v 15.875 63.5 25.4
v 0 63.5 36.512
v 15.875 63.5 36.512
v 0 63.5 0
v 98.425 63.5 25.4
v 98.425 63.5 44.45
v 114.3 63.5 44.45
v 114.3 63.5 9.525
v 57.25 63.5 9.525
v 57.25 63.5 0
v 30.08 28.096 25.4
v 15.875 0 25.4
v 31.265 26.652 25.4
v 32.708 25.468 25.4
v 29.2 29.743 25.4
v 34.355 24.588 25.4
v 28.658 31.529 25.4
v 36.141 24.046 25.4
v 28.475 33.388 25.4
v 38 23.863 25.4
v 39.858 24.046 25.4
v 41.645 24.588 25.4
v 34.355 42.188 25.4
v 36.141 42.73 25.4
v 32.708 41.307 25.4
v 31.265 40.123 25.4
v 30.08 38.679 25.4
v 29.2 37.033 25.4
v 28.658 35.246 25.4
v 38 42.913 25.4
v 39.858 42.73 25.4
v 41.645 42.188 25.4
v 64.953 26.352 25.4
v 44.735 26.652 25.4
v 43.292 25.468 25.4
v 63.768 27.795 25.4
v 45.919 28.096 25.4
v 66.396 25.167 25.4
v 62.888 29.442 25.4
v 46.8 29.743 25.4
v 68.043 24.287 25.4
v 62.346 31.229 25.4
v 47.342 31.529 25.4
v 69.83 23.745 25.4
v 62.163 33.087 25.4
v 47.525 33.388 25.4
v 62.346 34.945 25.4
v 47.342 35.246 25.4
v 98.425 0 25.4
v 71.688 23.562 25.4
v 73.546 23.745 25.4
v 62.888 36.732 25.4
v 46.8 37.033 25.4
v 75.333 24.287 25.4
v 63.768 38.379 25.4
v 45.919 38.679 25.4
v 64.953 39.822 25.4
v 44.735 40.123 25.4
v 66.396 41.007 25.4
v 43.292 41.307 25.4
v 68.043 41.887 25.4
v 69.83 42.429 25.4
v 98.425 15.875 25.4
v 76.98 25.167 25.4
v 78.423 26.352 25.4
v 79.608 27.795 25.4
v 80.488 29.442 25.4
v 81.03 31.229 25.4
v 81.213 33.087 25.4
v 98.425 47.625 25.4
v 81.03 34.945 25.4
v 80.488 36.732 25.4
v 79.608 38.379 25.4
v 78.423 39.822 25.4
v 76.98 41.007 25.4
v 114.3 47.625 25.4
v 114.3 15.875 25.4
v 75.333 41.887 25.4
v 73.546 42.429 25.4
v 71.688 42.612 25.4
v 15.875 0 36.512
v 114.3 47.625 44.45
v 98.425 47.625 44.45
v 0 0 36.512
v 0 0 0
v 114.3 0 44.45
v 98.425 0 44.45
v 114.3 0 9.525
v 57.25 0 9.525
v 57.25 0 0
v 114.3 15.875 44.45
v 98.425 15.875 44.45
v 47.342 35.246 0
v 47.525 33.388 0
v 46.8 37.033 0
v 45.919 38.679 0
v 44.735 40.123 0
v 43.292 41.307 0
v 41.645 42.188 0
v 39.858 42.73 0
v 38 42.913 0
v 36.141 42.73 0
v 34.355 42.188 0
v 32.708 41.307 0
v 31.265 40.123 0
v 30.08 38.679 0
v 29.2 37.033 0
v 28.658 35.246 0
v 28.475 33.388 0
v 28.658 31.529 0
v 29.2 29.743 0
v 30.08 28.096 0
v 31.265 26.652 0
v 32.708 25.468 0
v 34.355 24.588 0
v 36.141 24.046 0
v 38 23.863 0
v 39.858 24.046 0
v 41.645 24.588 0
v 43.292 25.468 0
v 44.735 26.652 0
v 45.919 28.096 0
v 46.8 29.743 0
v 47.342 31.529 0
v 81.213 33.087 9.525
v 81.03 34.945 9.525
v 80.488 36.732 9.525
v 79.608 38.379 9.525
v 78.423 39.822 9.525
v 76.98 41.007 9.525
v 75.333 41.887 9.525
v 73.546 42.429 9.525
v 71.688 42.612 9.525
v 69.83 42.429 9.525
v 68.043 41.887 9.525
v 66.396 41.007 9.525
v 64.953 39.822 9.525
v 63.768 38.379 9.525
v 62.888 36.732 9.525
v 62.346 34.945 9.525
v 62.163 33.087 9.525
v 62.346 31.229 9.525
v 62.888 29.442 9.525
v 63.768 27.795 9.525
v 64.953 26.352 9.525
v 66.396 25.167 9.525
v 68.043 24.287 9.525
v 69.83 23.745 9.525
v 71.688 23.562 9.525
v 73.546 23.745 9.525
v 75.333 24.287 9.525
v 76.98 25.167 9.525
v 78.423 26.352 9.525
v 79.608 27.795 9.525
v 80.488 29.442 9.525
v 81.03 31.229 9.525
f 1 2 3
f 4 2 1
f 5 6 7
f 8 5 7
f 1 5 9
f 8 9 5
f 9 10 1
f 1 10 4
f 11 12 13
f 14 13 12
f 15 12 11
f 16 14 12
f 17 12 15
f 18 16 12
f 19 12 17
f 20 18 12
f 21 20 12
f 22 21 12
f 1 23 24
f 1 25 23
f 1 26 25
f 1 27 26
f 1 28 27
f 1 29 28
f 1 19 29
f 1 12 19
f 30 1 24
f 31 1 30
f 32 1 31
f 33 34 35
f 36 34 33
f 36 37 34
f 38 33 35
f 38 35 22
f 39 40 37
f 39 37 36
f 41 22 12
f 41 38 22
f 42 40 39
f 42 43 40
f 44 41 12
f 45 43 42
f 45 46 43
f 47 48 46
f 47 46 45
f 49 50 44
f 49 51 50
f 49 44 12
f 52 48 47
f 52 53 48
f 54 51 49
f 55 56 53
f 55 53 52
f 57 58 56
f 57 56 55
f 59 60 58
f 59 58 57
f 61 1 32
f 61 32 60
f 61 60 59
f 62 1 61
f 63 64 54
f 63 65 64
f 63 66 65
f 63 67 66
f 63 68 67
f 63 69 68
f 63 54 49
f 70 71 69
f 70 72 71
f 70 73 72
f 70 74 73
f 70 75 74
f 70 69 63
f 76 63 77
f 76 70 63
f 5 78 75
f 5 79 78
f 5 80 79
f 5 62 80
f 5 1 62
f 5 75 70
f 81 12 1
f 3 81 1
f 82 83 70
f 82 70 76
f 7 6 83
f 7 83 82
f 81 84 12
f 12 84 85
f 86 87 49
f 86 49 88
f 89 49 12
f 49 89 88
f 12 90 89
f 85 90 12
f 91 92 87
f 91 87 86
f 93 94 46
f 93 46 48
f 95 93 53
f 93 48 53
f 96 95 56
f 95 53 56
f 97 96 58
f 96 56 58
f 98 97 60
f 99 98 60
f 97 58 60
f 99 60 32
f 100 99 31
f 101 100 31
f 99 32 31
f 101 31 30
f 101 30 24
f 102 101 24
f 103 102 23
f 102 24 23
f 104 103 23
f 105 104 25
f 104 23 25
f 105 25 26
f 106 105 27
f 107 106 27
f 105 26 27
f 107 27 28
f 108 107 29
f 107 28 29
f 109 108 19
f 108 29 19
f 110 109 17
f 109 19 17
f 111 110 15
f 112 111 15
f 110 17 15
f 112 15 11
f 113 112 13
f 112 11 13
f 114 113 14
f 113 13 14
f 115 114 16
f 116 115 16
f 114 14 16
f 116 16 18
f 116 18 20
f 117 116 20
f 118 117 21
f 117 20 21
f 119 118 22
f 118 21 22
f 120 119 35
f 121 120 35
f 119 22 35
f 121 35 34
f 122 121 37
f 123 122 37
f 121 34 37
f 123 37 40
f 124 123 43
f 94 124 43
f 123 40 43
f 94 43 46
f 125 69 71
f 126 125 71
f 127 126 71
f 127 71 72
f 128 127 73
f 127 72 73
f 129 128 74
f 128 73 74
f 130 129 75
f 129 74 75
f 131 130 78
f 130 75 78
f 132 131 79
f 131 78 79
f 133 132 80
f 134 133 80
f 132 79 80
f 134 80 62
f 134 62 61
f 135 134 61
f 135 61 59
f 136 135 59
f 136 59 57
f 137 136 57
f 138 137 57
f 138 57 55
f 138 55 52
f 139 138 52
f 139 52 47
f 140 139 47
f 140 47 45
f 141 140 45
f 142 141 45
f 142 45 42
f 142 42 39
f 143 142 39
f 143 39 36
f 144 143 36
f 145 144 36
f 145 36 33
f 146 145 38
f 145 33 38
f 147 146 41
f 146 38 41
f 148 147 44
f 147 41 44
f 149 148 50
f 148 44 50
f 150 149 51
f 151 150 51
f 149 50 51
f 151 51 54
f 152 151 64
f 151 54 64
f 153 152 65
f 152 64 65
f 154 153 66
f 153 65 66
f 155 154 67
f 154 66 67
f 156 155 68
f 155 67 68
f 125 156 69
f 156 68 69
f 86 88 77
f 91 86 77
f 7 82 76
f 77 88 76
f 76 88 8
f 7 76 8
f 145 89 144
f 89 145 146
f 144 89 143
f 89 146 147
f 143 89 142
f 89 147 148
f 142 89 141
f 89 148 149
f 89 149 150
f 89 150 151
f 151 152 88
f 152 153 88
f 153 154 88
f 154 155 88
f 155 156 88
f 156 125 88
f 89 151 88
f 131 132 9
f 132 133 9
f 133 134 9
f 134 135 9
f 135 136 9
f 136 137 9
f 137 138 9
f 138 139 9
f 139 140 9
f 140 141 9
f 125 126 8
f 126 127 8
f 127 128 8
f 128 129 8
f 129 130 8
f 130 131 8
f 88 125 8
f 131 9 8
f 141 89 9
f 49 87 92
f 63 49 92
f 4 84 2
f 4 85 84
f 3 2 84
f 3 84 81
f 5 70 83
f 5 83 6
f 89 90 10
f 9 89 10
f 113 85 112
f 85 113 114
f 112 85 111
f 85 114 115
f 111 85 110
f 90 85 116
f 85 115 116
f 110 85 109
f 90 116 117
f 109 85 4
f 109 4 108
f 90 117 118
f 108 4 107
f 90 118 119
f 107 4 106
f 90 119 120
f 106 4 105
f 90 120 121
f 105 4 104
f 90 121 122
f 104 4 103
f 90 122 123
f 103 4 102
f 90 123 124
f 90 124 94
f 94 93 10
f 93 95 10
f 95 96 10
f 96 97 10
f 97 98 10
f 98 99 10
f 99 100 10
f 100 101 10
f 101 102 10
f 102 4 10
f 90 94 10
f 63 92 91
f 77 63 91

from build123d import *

# Parameters (mm, degrees)
F0_W      = 114.3
F0_H      = 63.5
F1_DEPTH  = 36.5125
F2_W      = 114.3
F2_H      = 63.5
F3_DEPTH  = 11.1125
F4_W      = 57.1499951184
F4_H      = 64.068160916
F5_DEPTH  = 9.525
F6_W      = 15.875
F6_H      = 15.875
F7_DEPTH  = 19.05
F8_W      = 15.875
F8_H      = 15.875
F9_DEPTH  = 19.05
F10_W     = 15.875
F10_H     = 63.5
F11_DEPTH = 11.1125
F12_R     = 9.525
F13_DEPTH = 25.4
F14_R     = 9.525
F15_DEPTH = 25.4


with BuildPart() as f1:
    # F0 (on Top) → F1 (new body)
    with BuildSketch(Plane.XY):
        with Locations((57.15, 31.75)):
            Rectangle(F0_W, F0_H)
    extrude(amount=F1_DEPTH)

    # F2 (on face) → F3 (cut)
    with BuildSketch(Plane.XY.offset(36.5125)):
        with Locations((57.15, 31.75)):
            Rectangle(F2_W, F2_H)
    extrude(amount=-F3_DEPTH, mode=Mode.SUBTRACT)

    # F4 (on Top) → F5 (cut)
    with BuildSketch(Plane.XY):
        with Locations((85.8252625912, 32.034080458)):
            Rectangle(F4_W, F4_H)
    extrude(amount=F5_DEPTH, mode=Mode.SUBTRACT)

    # F6 (on face) → F7 (join)
    with BuildSketch(Plane.XY.offset(25.4)):
        with Locations((106.3625, 7.9375)):
            Rectangle(F6_W, F6_H)
    extrude(amount=F7_DEPTH)

    # F8 (on face) → F9 (join)
    with BuildSketch(Plane.XY.offset(25.4)):
        with Locations((106.3625, 55.5625)):
            Rectangle(F8_W, F8_H)
    extrude(amount=F9_DEPTH)

    # F10 (on face) → F11 (join)
    with BuildSketch(Plane.XY.offset(25.4)):
        with Locations((7.9375, 31.75)):
            Rectangle(F10_W, F10_H)
    extrude(amount=F11_DEPTH)

    # F12 (on face) → F13 (cut)
    with BuildSketch(Plane.XY.offset(25.4)):
        with Locations((37.9997342825, 33.3876311779)):
            Circle(F12_R)
    extrude(amount=-F13_DEPTH, mode=Mode.SUBTRACT)

    # F14 (on face) → F15 (cut)
    with BuildSketch(Plane.XY.offset(25.4)):
        with Locations((71.6881528497, 33.0868437886)):
            Circle(F14_R)
    extrude(amount=-F15_DEPTH, mode=Mode.SUBTRACT)


solid = f1.part
